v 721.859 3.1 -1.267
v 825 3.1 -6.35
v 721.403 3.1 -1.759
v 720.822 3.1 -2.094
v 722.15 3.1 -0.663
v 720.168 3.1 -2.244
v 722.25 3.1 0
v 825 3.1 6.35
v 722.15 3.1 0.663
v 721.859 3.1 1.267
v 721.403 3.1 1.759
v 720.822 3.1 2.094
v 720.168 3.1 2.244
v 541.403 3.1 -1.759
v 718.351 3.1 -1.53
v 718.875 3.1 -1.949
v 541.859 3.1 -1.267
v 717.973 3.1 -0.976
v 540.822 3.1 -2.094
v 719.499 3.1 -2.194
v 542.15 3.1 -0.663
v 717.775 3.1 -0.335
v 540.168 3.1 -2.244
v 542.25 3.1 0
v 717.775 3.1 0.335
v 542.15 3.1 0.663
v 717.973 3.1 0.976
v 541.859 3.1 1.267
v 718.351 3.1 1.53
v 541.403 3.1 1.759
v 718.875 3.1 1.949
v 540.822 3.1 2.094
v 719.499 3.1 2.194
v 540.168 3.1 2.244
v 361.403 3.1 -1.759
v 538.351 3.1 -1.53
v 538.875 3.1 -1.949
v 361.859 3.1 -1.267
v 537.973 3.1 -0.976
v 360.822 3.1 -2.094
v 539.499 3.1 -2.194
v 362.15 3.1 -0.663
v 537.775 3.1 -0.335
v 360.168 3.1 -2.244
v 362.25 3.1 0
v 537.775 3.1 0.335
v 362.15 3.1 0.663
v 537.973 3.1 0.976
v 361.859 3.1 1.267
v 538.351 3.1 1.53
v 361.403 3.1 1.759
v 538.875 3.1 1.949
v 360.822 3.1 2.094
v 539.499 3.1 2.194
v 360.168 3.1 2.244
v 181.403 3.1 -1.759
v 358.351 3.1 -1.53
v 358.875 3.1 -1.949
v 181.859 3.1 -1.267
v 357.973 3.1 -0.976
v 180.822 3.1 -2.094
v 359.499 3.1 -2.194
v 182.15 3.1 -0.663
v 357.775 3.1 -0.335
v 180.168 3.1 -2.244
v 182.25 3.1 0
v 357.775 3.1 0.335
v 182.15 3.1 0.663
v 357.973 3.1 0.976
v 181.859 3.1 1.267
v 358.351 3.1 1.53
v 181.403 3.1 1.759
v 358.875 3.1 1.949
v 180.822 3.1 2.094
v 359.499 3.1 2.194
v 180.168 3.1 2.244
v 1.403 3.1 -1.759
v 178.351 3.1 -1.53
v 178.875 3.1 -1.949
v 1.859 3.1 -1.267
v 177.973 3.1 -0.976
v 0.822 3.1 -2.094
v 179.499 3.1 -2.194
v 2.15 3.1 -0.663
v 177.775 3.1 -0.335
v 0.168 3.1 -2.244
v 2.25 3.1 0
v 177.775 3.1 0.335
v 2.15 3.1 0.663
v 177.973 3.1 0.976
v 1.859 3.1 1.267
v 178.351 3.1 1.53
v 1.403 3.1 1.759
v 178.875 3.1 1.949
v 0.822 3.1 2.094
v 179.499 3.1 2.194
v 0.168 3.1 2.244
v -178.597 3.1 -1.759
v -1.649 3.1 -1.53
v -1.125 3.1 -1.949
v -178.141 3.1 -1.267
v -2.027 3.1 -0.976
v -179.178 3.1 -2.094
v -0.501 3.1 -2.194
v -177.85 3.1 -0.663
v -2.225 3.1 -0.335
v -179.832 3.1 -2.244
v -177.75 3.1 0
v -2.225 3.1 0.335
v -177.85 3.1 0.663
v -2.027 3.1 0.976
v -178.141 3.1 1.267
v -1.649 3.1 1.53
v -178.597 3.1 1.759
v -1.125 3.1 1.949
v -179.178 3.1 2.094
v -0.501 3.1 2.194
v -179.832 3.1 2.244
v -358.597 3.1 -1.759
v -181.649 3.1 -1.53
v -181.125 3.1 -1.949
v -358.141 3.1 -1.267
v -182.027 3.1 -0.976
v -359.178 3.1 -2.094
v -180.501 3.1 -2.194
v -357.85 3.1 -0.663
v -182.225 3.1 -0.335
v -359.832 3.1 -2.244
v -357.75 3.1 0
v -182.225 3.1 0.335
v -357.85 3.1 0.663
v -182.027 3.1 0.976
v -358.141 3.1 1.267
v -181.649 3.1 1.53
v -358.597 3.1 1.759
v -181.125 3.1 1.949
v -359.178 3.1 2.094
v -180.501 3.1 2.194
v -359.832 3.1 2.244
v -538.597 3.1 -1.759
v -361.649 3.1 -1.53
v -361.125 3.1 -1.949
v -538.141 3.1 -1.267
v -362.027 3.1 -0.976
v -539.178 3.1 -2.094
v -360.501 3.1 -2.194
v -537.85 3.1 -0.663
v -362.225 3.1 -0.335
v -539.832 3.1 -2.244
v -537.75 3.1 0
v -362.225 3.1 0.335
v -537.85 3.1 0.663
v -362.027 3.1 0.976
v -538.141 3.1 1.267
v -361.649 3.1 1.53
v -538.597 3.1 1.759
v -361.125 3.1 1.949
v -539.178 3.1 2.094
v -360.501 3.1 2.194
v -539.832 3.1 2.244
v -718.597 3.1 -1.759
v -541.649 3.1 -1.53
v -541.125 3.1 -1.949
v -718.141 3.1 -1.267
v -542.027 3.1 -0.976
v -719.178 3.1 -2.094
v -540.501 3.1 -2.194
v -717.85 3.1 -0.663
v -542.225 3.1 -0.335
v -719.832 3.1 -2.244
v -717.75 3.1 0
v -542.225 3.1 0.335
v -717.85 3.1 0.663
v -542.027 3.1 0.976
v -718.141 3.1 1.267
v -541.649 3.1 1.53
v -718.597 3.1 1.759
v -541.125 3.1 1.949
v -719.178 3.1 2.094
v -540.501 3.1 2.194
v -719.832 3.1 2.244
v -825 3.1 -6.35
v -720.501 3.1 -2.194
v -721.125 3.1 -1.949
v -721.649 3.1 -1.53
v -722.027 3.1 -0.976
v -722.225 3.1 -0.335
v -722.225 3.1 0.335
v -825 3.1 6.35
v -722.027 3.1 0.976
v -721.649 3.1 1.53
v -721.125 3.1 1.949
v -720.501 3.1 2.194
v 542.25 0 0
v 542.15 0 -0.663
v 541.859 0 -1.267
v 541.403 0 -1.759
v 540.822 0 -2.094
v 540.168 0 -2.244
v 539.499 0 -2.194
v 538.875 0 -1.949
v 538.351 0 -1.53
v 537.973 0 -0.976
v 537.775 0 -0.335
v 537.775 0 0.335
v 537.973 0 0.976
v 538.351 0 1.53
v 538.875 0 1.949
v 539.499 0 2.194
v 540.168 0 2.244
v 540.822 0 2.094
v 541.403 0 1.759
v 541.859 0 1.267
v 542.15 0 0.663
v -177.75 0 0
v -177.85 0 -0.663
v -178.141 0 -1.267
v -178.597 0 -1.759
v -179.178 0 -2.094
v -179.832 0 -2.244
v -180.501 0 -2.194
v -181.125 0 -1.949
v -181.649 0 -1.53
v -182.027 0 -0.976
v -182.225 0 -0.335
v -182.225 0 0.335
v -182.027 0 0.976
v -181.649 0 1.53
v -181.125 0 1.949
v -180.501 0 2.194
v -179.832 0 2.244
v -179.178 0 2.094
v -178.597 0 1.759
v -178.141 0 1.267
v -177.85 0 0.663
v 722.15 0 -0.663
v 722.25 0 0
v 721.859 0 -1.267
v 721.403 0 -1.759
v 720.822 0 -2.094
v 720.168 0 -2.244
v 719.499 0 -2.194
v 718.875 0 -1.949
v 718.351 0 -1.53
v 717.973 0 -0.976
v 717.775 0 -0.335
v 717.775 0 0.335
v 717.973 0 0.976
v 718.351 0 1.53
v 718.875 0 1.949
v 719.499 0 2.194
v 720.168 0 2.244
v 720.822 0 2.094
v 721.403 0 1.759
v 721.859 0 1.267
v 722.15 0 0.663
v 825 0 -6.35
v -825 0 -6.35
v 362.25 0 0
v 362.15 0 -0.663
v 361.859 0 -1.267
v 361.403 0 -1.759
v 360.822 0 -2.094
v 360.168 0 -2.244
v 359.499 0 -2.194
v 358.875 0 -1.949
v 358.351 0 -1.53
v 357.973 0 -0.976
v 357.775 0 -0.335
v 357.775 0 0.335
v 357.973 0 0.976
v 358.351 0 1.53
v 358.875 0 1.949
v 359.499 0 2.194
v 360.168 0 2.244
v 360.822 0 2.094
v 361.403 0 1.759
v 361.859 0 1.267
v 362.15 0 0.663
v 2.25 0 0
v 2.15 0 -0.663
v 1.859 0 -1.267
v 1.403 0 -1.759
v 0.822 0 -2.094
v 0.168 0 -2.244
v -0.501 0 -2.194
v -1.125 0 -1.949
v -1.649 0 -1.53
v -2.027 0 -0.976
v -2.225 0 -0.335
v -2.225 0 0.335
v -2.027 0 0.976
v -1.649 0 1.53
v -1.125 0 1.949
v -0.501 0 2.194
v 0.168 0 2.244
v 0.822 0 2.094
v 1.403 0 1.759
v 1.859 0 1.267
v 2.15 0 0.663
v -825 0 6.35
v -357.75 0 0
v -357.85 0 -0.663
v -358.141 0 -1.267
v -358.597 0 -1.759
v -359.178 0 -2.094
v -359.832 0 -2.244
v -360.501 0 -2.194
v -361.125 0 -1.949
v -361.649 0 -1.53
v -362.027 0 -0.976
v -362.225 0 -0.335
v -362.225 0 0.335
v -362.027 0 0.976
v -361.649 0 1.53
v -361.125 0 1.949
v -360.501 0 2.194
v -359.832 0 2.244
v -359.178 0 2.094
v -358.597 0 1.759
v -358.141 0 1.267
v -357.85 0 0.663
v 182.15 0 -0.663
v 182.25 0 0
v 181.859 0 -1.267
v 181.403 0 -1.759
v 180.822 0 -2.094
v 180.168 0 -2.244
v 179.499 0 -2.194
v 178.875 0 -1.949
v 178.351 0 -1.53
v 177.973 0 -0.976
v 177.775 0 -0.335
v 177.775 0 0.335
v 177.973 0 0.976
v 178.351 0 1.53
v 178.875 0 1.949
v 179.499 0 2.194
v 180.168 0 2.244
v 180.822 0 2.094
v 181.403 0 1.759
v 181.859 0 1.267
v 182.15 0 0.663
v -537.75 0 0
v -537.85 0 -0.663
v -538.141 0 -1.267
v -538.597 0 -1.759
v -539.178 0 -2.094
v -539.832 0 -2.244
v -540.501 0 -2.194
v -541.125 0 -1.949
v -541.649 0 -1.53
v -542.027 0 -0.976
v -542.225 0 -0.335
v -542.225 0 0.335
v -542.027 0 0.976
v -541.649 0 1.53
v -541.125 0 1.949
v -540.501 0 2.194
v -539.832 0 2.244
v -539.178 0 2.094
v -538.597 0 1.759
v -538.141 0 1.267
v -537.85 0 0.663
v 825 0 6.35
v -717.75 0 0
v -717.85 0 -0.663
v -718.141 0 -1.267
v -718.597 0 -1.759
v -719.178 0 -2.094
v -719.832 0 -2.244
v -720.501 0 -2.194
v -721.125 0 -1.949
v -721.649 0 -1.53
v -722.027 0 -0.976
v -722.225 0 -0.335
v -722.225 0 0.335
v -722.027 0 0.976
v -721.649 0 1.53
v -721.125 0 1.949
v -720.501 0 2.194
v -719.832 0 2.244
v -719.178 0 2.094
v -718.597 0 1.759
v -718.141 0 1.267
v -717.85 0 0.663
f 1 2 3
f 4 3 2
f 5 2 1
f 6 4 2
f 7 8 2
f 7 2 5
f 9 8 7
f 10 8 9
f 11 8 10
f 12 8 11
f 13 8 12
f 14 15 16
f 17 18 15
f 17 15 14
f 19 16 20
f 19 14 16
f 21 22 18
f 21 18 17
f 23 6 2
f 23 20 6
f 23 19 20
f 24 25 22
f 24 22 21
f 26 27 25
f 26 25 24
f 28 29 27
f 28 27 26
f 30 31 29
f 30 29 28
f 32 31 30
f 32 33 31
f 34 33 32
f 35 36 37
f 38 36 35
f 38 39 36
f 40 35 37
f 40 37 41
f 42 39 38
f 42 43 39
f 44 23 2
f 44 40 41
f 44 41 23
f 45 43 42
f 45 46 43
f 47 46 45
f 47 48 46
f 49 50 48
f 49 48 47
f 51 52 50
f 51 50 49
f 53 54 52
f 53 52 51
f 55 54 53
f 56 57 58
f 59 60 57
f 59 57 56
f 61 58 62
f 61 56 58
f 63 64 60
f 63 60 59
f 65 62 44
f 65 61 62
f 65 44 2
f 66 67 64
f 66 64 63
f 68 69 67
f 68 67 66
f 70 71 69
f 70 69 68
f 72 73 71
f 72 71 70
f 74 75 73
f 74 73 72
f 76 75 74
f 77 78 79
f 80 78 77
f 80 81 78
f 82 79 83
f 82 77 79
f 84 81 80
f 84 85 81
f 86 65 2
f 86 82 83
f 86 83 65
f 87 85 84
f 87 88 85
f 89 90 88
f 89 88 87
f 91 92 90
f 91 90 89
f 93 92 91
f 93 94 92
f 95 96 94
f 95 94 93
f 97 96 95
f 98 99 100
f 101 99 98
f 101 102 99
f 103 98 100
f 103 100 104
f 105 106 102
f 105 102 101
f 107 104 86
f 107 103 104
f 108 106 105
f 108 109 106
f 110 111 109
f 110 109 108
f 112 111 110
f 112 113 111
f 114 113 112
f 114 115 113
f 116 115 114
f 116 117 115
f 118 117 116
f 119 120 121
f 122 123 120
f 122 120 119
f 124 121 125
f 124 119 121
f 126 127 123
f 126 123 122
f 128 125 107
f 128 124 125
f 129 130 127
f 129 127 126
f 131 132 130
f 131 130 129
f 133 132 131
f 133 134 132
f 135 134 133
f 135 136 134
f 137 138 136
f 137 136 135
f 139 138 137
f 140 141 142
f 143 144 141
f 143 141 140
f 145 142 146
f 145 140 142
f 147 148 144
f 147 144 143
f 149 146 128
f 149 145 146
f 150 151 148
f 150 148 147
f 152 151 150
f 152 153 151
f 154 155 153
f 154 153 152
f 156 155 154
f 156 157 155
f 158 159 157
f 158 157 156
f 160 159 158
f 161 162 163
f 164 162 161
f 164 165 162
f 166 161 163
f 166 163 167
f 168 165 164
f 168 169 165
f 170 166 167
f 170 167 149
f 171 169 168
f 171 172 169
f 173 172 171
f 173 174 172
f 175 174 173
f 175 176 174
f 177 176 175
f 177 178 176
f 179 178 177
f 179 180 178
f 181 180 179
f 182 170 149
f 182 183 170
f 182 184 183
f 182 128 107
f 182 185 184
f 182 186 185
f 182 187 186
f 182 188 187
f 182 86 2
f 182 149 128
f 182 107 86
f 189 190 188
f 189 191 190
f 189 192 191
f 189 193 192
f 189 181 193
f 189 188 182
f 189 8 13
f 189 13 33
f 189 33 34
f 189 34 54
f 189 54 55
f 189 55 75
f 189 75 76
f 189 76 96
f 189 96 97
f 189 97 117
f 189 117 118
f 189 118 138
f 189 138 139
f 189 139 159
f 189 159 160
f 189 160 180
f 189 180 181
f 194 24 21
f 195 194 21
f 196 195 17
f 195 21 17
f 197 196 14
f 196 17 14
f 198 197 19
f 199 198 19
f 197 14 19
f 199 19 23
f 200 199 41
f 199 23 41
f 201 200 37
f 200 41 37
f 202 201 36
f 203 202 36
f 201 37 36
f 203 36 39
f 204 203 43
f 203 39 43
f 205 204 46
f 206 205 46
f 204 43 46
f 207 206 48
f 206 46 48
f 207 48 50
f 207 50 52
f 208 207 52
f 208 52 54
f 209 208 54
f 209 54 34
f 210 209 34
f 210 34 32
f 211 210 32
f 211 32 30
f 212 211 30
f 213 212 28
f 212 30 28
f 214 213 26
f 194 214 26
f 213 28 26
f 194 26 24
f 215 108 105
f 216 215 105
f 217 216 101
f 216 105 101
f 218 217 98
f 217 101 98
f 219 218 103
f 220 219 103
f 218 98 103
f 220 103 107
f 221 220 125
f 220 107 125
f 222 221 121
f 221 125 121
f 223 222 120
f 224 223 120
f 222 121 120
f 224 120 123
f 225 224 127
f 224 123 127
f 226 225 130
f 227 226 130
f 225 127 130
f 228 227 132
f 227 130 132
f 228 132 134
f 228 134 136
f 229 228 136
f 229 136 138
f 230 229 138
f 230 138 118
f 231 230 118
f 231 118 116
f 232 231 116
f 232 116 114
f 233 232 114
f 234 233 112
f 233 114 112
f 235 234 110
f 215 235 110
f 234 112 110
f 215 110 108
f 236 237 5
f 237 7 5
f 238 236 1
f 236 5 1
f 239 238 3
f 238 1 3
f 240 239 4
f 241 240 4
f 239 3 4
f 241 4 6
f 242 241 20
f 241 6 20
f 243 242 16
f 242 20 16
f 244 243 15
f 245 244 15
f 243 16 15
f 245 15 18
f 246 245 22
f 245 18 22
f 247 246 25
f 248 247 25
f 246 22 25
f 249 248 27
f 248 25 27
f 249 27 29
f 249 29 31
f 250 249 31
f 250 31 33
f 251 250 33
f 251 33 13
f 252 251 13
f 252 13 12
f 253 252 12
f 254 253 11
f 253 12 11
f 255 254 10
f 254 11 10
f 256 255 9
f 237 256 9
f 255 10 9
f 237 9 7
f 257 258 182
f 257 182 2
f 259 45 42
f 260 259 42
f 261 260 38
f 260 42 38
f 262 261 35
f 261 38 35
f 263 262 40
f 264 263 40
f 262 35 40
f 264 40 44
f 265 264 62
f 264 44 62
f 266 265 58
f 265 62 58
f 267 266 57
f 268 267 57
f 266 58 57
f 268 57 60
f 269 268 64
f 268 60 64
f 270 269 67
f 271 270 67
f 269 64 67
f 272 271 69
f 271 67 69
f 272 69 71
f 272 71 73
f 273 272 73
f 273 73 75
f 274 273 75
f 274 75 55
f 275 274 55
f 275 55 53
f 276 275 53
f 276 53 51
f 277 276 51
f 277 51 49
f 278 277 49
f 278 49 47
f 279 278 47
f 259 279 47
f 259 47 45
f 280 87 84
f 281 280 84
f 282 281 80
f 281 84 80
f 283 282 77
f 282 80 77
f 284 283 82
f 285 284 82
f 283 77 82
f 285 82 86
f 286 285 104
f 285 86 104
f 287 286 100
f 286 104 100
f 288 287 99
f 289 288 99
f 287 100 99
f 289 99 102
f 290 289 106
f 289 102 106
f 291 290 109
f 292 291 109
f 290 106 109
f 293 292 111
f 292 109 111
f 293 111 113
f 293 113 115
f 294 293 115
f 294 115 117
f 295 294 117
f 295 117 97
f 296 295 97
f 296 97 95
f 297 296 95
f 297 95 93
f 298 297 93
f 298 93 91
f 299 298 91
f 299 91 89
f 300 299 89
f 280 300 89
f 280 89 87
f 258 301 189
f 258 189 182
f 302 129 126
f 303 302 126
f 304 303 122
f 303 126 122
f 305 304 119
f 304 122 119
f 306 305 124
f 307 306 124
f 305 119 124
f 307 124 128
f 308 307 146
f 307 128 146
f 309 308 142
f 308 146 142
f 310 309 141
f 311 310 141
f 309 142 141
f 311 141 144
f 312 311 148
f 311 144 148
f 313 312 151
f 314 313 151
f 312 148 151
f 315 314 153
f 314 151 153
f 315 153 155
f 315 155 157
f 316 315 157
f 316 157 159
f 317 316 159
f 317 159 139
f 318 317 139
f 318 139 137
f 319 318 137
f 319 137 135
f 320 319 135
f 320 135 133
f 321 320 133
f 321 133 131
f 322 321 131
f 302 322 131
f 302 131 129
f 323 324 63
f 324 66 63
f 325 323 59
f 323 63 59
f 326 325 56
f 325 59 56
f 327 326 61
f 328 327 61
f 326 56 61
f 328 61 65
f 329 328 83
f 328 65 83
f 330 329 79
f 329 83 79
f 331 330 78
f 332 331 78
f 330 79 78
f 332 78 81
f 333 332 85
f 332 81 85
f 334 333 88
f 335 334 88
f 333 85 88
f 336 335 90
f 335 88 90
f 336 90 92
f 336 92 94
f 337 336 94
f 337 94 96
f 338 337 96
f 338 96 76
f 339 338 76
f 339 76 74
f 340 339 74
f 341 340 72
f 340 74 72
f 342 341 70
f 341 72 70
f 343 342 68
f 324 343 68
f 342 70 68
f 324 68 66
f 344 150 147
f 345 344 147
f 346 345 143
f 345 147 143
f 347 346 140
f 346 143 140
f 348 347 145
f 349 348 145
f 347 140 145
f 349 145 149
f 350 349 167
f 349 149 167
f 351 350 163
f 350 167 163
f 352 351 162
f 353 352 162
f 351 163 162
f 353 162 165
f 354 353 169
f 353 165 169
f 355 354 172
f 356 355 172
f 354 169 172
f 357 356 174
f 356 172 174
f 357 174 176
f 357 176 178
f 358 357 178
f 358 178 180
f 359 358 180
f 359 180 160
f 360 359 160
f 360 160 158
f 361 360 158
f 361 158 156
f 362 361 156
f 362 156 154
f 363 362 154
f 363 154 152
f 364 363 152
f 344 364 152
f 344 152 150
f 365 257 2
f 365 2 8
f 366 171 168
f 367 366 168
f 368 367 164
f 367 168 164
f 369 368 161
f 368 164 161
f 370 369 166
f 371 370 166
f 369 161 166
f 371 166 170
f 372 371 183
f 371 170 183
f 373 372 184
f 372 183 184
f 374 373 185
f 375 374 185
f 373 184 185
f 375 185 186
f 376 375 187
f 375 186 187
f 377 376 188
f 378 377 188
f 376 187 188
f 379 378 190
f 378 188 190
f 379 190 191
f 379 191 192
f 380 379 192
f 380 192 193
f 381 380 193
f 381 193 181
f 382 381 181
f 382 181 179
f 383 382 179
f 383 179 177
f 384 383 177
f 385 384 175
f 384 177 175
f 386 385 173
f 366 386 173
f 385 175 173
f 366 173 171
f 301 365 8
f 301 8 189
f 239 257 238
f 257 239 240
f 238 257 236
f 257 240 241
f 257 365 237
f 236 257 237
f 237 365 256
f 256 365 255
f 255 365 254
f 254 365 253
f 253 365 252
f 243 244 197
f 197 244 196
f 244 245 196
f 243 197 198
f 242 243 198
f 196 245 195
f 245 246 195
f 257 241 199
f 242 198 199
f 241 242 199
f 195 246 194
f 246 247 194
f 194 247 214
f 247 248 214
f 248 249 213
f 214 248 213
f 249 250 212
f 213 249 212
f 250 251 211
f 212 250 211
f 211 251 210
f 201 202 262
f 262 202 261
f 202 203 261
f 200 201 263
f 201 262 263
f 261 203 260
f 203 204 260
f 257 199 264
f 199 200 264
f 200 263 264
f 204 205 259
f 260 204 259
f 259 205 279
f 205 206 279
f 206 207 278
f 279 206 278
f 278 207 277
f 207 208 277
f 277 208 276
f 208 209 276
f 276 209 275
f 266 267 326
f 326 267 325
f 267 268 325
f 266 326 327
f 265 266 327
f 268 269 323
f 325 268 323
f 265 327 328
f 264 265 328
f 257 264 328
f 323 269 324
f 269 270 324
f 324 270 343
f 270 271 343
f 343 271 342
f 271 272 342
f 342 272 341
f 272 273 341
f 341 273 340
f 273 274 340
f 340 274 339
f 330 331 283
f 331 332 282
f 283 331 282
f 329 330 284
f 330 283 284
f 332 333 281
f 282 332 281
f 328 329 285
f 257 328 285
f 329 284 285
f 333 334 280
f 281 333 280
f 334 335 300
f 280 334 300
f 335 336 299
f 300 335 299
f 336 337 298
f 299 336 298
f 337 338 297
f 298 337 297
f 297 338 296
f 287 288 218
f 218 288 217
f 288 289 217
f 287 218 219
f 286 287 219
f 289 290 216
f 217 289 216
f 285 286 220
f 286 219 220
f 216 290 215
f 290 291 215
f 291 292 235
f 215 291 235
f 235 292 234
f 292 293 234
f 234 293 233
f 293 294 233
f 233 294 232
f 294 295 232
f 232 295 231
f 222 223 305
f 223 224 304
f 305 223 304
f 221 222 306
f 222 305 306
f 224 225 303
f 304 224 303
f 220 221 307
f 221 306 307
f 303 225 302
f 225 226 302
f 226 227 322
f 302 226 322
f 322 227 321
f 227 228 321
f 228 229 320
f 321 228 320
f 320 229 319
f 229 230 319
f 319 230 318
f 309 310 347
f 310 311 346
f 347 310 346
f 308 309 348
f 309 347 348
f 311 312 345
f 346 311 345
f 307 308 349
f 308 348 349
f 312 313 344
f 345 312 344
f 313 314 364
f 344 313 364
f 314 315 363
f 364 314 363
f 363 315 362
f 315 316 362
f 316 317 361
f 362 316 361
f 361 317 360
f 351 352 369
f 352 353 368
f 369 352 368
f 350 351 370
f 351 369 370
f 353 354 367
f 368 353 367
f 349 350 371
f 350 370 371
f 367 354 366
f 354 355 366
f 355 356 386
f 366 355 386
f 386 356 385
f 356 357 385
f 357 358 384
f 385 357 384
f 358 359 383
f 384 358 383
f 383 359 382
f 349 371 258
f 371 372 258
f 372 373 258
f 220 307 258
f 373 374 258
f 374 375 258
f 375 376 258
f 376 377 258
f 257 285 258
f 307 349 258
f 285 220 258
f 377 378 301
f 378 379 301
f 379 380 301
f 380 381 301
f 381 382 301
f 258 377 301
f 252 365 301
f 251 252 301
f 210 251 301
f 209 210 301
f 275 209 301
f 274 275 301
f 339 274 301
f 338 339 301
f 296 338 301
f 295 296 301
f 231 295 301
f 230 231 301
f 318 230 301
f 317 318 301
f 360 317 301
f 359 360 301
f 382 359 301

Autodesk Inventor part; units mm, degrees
ref_plane "YZ Plane" through (0, 0, 0) normal (1, 0, 0) x (0, 1, 0)
ref_plane "XZ Plane" through (0, 0, 0) normal (0, 1, 0) x (-1, 0, 0)
ref_plane "XY Plane" through (0, 0, 0) normal (0, 0, 1) x (1, 0, 0)
sketch "Sketch1" plane through (0, 0, 0) normal (0, 1, 0) x (-1, 0, 0)
  line L0 (-825, 6.35) -> (825, 6.35)
  line L1 (825, 6.35) -> (825, -6.35)
  line L2 (825, -6.35) -> (-825, -6.35)
  line L3 (-825, -6.35) -> (-825, 6.35)
  line L4 (-825, 6.35) -> (825, -6.35) construction
  line L5 (825, 6.35) -> (-825, -6.35) construction
  point P0 (0, 0)
  dimension "d0" = 1650
  dimension "d1" = 12.7
extrude "Extrusion1" add sketch "Sketch1" along normal blind 3.1
sketch "Sketch2" plane through (0, 3.1, 0) normal (0, 1, 0) x (1, 0, 0)
  circle A0 centre (0, 0) radius 2.25
  dimension "d4" = 4.5
extrude "Extrusion2" cut sketch "Sketch2" against normal blind 3.1
sketch "Sketch4" plane through (0, 3.1, 0) normal (0, 1, 0) x (1, 0, 0)
  line L0 (-825, -6.35) -> (825, -6.35) projected
  line L1 (825, 6.35) -> (-825, 6.35) projected
  line L2 (-825, -6.35) -> (825, -6.35)
  line L3 (825, -6.35) -> (825, 6.35)
  line L4 (825, 6.35) -> (-825, 6.35)
  line L5 (-825, 6.35) -> (-825, -6.35)
  circle A0 centre (0, 0) radius 2.25
  circle A1 centre (180, 0) radius 2.25
  circle A2 centre (360, 0) radius 2.25
  circle A3 centre (540, 0) radius 2.25
  circle A4 centre (720, 0) radius 2.25
  circle A5 centre (-180, 0) radius 2.25
  circle A6 centre (0, 0) radius 2.25
  circle A7 centre (180, 0) radius 2.25
  circle A8 centre (360, 0) radius 2.25
  circle A9 centre (540, 0) radius 2.25
  circle A10 centre (-360, 0) radius 2.25
  circle A11 centre (-180, 0) radius 2.25
  circle A12 centre (0, 0) radius 2.25
  circle A13 centre (180, 0) radius 2.25
  circle A14 centre (360, 0) radius 2.25
  circle A15 centre (-540, 0) radius 2.25
  circle A16 centre (-360, 0) radius 2.25
  circle A17 centre (-180, 0) radius 2.25
  circle A18 centre (0, 0) radius 2.25
  circle A19 centre (180, 0) radius 2.25
  circle A20 centre (-720, 0) radius 2.25
  circle A21 centre (-540, 0) radius 2.25
  circle A22 centre (-360, 0) radius 2.25
  circle A23 centre (-180, 0) radius 2.25
  circle A24 centre (0, 0) radius 2.25
  dimension "d9" = 180
  dimension "d12" = 180
extrude "Extrusion3" cut sketch "Sketch4" against normal blind 180 contours A0 | A1 | A2 | A3 | A4 | A5 | A10 | A15 | A20
equation "\"d15\" = d9"
properties part number "seguroAcrilico"
